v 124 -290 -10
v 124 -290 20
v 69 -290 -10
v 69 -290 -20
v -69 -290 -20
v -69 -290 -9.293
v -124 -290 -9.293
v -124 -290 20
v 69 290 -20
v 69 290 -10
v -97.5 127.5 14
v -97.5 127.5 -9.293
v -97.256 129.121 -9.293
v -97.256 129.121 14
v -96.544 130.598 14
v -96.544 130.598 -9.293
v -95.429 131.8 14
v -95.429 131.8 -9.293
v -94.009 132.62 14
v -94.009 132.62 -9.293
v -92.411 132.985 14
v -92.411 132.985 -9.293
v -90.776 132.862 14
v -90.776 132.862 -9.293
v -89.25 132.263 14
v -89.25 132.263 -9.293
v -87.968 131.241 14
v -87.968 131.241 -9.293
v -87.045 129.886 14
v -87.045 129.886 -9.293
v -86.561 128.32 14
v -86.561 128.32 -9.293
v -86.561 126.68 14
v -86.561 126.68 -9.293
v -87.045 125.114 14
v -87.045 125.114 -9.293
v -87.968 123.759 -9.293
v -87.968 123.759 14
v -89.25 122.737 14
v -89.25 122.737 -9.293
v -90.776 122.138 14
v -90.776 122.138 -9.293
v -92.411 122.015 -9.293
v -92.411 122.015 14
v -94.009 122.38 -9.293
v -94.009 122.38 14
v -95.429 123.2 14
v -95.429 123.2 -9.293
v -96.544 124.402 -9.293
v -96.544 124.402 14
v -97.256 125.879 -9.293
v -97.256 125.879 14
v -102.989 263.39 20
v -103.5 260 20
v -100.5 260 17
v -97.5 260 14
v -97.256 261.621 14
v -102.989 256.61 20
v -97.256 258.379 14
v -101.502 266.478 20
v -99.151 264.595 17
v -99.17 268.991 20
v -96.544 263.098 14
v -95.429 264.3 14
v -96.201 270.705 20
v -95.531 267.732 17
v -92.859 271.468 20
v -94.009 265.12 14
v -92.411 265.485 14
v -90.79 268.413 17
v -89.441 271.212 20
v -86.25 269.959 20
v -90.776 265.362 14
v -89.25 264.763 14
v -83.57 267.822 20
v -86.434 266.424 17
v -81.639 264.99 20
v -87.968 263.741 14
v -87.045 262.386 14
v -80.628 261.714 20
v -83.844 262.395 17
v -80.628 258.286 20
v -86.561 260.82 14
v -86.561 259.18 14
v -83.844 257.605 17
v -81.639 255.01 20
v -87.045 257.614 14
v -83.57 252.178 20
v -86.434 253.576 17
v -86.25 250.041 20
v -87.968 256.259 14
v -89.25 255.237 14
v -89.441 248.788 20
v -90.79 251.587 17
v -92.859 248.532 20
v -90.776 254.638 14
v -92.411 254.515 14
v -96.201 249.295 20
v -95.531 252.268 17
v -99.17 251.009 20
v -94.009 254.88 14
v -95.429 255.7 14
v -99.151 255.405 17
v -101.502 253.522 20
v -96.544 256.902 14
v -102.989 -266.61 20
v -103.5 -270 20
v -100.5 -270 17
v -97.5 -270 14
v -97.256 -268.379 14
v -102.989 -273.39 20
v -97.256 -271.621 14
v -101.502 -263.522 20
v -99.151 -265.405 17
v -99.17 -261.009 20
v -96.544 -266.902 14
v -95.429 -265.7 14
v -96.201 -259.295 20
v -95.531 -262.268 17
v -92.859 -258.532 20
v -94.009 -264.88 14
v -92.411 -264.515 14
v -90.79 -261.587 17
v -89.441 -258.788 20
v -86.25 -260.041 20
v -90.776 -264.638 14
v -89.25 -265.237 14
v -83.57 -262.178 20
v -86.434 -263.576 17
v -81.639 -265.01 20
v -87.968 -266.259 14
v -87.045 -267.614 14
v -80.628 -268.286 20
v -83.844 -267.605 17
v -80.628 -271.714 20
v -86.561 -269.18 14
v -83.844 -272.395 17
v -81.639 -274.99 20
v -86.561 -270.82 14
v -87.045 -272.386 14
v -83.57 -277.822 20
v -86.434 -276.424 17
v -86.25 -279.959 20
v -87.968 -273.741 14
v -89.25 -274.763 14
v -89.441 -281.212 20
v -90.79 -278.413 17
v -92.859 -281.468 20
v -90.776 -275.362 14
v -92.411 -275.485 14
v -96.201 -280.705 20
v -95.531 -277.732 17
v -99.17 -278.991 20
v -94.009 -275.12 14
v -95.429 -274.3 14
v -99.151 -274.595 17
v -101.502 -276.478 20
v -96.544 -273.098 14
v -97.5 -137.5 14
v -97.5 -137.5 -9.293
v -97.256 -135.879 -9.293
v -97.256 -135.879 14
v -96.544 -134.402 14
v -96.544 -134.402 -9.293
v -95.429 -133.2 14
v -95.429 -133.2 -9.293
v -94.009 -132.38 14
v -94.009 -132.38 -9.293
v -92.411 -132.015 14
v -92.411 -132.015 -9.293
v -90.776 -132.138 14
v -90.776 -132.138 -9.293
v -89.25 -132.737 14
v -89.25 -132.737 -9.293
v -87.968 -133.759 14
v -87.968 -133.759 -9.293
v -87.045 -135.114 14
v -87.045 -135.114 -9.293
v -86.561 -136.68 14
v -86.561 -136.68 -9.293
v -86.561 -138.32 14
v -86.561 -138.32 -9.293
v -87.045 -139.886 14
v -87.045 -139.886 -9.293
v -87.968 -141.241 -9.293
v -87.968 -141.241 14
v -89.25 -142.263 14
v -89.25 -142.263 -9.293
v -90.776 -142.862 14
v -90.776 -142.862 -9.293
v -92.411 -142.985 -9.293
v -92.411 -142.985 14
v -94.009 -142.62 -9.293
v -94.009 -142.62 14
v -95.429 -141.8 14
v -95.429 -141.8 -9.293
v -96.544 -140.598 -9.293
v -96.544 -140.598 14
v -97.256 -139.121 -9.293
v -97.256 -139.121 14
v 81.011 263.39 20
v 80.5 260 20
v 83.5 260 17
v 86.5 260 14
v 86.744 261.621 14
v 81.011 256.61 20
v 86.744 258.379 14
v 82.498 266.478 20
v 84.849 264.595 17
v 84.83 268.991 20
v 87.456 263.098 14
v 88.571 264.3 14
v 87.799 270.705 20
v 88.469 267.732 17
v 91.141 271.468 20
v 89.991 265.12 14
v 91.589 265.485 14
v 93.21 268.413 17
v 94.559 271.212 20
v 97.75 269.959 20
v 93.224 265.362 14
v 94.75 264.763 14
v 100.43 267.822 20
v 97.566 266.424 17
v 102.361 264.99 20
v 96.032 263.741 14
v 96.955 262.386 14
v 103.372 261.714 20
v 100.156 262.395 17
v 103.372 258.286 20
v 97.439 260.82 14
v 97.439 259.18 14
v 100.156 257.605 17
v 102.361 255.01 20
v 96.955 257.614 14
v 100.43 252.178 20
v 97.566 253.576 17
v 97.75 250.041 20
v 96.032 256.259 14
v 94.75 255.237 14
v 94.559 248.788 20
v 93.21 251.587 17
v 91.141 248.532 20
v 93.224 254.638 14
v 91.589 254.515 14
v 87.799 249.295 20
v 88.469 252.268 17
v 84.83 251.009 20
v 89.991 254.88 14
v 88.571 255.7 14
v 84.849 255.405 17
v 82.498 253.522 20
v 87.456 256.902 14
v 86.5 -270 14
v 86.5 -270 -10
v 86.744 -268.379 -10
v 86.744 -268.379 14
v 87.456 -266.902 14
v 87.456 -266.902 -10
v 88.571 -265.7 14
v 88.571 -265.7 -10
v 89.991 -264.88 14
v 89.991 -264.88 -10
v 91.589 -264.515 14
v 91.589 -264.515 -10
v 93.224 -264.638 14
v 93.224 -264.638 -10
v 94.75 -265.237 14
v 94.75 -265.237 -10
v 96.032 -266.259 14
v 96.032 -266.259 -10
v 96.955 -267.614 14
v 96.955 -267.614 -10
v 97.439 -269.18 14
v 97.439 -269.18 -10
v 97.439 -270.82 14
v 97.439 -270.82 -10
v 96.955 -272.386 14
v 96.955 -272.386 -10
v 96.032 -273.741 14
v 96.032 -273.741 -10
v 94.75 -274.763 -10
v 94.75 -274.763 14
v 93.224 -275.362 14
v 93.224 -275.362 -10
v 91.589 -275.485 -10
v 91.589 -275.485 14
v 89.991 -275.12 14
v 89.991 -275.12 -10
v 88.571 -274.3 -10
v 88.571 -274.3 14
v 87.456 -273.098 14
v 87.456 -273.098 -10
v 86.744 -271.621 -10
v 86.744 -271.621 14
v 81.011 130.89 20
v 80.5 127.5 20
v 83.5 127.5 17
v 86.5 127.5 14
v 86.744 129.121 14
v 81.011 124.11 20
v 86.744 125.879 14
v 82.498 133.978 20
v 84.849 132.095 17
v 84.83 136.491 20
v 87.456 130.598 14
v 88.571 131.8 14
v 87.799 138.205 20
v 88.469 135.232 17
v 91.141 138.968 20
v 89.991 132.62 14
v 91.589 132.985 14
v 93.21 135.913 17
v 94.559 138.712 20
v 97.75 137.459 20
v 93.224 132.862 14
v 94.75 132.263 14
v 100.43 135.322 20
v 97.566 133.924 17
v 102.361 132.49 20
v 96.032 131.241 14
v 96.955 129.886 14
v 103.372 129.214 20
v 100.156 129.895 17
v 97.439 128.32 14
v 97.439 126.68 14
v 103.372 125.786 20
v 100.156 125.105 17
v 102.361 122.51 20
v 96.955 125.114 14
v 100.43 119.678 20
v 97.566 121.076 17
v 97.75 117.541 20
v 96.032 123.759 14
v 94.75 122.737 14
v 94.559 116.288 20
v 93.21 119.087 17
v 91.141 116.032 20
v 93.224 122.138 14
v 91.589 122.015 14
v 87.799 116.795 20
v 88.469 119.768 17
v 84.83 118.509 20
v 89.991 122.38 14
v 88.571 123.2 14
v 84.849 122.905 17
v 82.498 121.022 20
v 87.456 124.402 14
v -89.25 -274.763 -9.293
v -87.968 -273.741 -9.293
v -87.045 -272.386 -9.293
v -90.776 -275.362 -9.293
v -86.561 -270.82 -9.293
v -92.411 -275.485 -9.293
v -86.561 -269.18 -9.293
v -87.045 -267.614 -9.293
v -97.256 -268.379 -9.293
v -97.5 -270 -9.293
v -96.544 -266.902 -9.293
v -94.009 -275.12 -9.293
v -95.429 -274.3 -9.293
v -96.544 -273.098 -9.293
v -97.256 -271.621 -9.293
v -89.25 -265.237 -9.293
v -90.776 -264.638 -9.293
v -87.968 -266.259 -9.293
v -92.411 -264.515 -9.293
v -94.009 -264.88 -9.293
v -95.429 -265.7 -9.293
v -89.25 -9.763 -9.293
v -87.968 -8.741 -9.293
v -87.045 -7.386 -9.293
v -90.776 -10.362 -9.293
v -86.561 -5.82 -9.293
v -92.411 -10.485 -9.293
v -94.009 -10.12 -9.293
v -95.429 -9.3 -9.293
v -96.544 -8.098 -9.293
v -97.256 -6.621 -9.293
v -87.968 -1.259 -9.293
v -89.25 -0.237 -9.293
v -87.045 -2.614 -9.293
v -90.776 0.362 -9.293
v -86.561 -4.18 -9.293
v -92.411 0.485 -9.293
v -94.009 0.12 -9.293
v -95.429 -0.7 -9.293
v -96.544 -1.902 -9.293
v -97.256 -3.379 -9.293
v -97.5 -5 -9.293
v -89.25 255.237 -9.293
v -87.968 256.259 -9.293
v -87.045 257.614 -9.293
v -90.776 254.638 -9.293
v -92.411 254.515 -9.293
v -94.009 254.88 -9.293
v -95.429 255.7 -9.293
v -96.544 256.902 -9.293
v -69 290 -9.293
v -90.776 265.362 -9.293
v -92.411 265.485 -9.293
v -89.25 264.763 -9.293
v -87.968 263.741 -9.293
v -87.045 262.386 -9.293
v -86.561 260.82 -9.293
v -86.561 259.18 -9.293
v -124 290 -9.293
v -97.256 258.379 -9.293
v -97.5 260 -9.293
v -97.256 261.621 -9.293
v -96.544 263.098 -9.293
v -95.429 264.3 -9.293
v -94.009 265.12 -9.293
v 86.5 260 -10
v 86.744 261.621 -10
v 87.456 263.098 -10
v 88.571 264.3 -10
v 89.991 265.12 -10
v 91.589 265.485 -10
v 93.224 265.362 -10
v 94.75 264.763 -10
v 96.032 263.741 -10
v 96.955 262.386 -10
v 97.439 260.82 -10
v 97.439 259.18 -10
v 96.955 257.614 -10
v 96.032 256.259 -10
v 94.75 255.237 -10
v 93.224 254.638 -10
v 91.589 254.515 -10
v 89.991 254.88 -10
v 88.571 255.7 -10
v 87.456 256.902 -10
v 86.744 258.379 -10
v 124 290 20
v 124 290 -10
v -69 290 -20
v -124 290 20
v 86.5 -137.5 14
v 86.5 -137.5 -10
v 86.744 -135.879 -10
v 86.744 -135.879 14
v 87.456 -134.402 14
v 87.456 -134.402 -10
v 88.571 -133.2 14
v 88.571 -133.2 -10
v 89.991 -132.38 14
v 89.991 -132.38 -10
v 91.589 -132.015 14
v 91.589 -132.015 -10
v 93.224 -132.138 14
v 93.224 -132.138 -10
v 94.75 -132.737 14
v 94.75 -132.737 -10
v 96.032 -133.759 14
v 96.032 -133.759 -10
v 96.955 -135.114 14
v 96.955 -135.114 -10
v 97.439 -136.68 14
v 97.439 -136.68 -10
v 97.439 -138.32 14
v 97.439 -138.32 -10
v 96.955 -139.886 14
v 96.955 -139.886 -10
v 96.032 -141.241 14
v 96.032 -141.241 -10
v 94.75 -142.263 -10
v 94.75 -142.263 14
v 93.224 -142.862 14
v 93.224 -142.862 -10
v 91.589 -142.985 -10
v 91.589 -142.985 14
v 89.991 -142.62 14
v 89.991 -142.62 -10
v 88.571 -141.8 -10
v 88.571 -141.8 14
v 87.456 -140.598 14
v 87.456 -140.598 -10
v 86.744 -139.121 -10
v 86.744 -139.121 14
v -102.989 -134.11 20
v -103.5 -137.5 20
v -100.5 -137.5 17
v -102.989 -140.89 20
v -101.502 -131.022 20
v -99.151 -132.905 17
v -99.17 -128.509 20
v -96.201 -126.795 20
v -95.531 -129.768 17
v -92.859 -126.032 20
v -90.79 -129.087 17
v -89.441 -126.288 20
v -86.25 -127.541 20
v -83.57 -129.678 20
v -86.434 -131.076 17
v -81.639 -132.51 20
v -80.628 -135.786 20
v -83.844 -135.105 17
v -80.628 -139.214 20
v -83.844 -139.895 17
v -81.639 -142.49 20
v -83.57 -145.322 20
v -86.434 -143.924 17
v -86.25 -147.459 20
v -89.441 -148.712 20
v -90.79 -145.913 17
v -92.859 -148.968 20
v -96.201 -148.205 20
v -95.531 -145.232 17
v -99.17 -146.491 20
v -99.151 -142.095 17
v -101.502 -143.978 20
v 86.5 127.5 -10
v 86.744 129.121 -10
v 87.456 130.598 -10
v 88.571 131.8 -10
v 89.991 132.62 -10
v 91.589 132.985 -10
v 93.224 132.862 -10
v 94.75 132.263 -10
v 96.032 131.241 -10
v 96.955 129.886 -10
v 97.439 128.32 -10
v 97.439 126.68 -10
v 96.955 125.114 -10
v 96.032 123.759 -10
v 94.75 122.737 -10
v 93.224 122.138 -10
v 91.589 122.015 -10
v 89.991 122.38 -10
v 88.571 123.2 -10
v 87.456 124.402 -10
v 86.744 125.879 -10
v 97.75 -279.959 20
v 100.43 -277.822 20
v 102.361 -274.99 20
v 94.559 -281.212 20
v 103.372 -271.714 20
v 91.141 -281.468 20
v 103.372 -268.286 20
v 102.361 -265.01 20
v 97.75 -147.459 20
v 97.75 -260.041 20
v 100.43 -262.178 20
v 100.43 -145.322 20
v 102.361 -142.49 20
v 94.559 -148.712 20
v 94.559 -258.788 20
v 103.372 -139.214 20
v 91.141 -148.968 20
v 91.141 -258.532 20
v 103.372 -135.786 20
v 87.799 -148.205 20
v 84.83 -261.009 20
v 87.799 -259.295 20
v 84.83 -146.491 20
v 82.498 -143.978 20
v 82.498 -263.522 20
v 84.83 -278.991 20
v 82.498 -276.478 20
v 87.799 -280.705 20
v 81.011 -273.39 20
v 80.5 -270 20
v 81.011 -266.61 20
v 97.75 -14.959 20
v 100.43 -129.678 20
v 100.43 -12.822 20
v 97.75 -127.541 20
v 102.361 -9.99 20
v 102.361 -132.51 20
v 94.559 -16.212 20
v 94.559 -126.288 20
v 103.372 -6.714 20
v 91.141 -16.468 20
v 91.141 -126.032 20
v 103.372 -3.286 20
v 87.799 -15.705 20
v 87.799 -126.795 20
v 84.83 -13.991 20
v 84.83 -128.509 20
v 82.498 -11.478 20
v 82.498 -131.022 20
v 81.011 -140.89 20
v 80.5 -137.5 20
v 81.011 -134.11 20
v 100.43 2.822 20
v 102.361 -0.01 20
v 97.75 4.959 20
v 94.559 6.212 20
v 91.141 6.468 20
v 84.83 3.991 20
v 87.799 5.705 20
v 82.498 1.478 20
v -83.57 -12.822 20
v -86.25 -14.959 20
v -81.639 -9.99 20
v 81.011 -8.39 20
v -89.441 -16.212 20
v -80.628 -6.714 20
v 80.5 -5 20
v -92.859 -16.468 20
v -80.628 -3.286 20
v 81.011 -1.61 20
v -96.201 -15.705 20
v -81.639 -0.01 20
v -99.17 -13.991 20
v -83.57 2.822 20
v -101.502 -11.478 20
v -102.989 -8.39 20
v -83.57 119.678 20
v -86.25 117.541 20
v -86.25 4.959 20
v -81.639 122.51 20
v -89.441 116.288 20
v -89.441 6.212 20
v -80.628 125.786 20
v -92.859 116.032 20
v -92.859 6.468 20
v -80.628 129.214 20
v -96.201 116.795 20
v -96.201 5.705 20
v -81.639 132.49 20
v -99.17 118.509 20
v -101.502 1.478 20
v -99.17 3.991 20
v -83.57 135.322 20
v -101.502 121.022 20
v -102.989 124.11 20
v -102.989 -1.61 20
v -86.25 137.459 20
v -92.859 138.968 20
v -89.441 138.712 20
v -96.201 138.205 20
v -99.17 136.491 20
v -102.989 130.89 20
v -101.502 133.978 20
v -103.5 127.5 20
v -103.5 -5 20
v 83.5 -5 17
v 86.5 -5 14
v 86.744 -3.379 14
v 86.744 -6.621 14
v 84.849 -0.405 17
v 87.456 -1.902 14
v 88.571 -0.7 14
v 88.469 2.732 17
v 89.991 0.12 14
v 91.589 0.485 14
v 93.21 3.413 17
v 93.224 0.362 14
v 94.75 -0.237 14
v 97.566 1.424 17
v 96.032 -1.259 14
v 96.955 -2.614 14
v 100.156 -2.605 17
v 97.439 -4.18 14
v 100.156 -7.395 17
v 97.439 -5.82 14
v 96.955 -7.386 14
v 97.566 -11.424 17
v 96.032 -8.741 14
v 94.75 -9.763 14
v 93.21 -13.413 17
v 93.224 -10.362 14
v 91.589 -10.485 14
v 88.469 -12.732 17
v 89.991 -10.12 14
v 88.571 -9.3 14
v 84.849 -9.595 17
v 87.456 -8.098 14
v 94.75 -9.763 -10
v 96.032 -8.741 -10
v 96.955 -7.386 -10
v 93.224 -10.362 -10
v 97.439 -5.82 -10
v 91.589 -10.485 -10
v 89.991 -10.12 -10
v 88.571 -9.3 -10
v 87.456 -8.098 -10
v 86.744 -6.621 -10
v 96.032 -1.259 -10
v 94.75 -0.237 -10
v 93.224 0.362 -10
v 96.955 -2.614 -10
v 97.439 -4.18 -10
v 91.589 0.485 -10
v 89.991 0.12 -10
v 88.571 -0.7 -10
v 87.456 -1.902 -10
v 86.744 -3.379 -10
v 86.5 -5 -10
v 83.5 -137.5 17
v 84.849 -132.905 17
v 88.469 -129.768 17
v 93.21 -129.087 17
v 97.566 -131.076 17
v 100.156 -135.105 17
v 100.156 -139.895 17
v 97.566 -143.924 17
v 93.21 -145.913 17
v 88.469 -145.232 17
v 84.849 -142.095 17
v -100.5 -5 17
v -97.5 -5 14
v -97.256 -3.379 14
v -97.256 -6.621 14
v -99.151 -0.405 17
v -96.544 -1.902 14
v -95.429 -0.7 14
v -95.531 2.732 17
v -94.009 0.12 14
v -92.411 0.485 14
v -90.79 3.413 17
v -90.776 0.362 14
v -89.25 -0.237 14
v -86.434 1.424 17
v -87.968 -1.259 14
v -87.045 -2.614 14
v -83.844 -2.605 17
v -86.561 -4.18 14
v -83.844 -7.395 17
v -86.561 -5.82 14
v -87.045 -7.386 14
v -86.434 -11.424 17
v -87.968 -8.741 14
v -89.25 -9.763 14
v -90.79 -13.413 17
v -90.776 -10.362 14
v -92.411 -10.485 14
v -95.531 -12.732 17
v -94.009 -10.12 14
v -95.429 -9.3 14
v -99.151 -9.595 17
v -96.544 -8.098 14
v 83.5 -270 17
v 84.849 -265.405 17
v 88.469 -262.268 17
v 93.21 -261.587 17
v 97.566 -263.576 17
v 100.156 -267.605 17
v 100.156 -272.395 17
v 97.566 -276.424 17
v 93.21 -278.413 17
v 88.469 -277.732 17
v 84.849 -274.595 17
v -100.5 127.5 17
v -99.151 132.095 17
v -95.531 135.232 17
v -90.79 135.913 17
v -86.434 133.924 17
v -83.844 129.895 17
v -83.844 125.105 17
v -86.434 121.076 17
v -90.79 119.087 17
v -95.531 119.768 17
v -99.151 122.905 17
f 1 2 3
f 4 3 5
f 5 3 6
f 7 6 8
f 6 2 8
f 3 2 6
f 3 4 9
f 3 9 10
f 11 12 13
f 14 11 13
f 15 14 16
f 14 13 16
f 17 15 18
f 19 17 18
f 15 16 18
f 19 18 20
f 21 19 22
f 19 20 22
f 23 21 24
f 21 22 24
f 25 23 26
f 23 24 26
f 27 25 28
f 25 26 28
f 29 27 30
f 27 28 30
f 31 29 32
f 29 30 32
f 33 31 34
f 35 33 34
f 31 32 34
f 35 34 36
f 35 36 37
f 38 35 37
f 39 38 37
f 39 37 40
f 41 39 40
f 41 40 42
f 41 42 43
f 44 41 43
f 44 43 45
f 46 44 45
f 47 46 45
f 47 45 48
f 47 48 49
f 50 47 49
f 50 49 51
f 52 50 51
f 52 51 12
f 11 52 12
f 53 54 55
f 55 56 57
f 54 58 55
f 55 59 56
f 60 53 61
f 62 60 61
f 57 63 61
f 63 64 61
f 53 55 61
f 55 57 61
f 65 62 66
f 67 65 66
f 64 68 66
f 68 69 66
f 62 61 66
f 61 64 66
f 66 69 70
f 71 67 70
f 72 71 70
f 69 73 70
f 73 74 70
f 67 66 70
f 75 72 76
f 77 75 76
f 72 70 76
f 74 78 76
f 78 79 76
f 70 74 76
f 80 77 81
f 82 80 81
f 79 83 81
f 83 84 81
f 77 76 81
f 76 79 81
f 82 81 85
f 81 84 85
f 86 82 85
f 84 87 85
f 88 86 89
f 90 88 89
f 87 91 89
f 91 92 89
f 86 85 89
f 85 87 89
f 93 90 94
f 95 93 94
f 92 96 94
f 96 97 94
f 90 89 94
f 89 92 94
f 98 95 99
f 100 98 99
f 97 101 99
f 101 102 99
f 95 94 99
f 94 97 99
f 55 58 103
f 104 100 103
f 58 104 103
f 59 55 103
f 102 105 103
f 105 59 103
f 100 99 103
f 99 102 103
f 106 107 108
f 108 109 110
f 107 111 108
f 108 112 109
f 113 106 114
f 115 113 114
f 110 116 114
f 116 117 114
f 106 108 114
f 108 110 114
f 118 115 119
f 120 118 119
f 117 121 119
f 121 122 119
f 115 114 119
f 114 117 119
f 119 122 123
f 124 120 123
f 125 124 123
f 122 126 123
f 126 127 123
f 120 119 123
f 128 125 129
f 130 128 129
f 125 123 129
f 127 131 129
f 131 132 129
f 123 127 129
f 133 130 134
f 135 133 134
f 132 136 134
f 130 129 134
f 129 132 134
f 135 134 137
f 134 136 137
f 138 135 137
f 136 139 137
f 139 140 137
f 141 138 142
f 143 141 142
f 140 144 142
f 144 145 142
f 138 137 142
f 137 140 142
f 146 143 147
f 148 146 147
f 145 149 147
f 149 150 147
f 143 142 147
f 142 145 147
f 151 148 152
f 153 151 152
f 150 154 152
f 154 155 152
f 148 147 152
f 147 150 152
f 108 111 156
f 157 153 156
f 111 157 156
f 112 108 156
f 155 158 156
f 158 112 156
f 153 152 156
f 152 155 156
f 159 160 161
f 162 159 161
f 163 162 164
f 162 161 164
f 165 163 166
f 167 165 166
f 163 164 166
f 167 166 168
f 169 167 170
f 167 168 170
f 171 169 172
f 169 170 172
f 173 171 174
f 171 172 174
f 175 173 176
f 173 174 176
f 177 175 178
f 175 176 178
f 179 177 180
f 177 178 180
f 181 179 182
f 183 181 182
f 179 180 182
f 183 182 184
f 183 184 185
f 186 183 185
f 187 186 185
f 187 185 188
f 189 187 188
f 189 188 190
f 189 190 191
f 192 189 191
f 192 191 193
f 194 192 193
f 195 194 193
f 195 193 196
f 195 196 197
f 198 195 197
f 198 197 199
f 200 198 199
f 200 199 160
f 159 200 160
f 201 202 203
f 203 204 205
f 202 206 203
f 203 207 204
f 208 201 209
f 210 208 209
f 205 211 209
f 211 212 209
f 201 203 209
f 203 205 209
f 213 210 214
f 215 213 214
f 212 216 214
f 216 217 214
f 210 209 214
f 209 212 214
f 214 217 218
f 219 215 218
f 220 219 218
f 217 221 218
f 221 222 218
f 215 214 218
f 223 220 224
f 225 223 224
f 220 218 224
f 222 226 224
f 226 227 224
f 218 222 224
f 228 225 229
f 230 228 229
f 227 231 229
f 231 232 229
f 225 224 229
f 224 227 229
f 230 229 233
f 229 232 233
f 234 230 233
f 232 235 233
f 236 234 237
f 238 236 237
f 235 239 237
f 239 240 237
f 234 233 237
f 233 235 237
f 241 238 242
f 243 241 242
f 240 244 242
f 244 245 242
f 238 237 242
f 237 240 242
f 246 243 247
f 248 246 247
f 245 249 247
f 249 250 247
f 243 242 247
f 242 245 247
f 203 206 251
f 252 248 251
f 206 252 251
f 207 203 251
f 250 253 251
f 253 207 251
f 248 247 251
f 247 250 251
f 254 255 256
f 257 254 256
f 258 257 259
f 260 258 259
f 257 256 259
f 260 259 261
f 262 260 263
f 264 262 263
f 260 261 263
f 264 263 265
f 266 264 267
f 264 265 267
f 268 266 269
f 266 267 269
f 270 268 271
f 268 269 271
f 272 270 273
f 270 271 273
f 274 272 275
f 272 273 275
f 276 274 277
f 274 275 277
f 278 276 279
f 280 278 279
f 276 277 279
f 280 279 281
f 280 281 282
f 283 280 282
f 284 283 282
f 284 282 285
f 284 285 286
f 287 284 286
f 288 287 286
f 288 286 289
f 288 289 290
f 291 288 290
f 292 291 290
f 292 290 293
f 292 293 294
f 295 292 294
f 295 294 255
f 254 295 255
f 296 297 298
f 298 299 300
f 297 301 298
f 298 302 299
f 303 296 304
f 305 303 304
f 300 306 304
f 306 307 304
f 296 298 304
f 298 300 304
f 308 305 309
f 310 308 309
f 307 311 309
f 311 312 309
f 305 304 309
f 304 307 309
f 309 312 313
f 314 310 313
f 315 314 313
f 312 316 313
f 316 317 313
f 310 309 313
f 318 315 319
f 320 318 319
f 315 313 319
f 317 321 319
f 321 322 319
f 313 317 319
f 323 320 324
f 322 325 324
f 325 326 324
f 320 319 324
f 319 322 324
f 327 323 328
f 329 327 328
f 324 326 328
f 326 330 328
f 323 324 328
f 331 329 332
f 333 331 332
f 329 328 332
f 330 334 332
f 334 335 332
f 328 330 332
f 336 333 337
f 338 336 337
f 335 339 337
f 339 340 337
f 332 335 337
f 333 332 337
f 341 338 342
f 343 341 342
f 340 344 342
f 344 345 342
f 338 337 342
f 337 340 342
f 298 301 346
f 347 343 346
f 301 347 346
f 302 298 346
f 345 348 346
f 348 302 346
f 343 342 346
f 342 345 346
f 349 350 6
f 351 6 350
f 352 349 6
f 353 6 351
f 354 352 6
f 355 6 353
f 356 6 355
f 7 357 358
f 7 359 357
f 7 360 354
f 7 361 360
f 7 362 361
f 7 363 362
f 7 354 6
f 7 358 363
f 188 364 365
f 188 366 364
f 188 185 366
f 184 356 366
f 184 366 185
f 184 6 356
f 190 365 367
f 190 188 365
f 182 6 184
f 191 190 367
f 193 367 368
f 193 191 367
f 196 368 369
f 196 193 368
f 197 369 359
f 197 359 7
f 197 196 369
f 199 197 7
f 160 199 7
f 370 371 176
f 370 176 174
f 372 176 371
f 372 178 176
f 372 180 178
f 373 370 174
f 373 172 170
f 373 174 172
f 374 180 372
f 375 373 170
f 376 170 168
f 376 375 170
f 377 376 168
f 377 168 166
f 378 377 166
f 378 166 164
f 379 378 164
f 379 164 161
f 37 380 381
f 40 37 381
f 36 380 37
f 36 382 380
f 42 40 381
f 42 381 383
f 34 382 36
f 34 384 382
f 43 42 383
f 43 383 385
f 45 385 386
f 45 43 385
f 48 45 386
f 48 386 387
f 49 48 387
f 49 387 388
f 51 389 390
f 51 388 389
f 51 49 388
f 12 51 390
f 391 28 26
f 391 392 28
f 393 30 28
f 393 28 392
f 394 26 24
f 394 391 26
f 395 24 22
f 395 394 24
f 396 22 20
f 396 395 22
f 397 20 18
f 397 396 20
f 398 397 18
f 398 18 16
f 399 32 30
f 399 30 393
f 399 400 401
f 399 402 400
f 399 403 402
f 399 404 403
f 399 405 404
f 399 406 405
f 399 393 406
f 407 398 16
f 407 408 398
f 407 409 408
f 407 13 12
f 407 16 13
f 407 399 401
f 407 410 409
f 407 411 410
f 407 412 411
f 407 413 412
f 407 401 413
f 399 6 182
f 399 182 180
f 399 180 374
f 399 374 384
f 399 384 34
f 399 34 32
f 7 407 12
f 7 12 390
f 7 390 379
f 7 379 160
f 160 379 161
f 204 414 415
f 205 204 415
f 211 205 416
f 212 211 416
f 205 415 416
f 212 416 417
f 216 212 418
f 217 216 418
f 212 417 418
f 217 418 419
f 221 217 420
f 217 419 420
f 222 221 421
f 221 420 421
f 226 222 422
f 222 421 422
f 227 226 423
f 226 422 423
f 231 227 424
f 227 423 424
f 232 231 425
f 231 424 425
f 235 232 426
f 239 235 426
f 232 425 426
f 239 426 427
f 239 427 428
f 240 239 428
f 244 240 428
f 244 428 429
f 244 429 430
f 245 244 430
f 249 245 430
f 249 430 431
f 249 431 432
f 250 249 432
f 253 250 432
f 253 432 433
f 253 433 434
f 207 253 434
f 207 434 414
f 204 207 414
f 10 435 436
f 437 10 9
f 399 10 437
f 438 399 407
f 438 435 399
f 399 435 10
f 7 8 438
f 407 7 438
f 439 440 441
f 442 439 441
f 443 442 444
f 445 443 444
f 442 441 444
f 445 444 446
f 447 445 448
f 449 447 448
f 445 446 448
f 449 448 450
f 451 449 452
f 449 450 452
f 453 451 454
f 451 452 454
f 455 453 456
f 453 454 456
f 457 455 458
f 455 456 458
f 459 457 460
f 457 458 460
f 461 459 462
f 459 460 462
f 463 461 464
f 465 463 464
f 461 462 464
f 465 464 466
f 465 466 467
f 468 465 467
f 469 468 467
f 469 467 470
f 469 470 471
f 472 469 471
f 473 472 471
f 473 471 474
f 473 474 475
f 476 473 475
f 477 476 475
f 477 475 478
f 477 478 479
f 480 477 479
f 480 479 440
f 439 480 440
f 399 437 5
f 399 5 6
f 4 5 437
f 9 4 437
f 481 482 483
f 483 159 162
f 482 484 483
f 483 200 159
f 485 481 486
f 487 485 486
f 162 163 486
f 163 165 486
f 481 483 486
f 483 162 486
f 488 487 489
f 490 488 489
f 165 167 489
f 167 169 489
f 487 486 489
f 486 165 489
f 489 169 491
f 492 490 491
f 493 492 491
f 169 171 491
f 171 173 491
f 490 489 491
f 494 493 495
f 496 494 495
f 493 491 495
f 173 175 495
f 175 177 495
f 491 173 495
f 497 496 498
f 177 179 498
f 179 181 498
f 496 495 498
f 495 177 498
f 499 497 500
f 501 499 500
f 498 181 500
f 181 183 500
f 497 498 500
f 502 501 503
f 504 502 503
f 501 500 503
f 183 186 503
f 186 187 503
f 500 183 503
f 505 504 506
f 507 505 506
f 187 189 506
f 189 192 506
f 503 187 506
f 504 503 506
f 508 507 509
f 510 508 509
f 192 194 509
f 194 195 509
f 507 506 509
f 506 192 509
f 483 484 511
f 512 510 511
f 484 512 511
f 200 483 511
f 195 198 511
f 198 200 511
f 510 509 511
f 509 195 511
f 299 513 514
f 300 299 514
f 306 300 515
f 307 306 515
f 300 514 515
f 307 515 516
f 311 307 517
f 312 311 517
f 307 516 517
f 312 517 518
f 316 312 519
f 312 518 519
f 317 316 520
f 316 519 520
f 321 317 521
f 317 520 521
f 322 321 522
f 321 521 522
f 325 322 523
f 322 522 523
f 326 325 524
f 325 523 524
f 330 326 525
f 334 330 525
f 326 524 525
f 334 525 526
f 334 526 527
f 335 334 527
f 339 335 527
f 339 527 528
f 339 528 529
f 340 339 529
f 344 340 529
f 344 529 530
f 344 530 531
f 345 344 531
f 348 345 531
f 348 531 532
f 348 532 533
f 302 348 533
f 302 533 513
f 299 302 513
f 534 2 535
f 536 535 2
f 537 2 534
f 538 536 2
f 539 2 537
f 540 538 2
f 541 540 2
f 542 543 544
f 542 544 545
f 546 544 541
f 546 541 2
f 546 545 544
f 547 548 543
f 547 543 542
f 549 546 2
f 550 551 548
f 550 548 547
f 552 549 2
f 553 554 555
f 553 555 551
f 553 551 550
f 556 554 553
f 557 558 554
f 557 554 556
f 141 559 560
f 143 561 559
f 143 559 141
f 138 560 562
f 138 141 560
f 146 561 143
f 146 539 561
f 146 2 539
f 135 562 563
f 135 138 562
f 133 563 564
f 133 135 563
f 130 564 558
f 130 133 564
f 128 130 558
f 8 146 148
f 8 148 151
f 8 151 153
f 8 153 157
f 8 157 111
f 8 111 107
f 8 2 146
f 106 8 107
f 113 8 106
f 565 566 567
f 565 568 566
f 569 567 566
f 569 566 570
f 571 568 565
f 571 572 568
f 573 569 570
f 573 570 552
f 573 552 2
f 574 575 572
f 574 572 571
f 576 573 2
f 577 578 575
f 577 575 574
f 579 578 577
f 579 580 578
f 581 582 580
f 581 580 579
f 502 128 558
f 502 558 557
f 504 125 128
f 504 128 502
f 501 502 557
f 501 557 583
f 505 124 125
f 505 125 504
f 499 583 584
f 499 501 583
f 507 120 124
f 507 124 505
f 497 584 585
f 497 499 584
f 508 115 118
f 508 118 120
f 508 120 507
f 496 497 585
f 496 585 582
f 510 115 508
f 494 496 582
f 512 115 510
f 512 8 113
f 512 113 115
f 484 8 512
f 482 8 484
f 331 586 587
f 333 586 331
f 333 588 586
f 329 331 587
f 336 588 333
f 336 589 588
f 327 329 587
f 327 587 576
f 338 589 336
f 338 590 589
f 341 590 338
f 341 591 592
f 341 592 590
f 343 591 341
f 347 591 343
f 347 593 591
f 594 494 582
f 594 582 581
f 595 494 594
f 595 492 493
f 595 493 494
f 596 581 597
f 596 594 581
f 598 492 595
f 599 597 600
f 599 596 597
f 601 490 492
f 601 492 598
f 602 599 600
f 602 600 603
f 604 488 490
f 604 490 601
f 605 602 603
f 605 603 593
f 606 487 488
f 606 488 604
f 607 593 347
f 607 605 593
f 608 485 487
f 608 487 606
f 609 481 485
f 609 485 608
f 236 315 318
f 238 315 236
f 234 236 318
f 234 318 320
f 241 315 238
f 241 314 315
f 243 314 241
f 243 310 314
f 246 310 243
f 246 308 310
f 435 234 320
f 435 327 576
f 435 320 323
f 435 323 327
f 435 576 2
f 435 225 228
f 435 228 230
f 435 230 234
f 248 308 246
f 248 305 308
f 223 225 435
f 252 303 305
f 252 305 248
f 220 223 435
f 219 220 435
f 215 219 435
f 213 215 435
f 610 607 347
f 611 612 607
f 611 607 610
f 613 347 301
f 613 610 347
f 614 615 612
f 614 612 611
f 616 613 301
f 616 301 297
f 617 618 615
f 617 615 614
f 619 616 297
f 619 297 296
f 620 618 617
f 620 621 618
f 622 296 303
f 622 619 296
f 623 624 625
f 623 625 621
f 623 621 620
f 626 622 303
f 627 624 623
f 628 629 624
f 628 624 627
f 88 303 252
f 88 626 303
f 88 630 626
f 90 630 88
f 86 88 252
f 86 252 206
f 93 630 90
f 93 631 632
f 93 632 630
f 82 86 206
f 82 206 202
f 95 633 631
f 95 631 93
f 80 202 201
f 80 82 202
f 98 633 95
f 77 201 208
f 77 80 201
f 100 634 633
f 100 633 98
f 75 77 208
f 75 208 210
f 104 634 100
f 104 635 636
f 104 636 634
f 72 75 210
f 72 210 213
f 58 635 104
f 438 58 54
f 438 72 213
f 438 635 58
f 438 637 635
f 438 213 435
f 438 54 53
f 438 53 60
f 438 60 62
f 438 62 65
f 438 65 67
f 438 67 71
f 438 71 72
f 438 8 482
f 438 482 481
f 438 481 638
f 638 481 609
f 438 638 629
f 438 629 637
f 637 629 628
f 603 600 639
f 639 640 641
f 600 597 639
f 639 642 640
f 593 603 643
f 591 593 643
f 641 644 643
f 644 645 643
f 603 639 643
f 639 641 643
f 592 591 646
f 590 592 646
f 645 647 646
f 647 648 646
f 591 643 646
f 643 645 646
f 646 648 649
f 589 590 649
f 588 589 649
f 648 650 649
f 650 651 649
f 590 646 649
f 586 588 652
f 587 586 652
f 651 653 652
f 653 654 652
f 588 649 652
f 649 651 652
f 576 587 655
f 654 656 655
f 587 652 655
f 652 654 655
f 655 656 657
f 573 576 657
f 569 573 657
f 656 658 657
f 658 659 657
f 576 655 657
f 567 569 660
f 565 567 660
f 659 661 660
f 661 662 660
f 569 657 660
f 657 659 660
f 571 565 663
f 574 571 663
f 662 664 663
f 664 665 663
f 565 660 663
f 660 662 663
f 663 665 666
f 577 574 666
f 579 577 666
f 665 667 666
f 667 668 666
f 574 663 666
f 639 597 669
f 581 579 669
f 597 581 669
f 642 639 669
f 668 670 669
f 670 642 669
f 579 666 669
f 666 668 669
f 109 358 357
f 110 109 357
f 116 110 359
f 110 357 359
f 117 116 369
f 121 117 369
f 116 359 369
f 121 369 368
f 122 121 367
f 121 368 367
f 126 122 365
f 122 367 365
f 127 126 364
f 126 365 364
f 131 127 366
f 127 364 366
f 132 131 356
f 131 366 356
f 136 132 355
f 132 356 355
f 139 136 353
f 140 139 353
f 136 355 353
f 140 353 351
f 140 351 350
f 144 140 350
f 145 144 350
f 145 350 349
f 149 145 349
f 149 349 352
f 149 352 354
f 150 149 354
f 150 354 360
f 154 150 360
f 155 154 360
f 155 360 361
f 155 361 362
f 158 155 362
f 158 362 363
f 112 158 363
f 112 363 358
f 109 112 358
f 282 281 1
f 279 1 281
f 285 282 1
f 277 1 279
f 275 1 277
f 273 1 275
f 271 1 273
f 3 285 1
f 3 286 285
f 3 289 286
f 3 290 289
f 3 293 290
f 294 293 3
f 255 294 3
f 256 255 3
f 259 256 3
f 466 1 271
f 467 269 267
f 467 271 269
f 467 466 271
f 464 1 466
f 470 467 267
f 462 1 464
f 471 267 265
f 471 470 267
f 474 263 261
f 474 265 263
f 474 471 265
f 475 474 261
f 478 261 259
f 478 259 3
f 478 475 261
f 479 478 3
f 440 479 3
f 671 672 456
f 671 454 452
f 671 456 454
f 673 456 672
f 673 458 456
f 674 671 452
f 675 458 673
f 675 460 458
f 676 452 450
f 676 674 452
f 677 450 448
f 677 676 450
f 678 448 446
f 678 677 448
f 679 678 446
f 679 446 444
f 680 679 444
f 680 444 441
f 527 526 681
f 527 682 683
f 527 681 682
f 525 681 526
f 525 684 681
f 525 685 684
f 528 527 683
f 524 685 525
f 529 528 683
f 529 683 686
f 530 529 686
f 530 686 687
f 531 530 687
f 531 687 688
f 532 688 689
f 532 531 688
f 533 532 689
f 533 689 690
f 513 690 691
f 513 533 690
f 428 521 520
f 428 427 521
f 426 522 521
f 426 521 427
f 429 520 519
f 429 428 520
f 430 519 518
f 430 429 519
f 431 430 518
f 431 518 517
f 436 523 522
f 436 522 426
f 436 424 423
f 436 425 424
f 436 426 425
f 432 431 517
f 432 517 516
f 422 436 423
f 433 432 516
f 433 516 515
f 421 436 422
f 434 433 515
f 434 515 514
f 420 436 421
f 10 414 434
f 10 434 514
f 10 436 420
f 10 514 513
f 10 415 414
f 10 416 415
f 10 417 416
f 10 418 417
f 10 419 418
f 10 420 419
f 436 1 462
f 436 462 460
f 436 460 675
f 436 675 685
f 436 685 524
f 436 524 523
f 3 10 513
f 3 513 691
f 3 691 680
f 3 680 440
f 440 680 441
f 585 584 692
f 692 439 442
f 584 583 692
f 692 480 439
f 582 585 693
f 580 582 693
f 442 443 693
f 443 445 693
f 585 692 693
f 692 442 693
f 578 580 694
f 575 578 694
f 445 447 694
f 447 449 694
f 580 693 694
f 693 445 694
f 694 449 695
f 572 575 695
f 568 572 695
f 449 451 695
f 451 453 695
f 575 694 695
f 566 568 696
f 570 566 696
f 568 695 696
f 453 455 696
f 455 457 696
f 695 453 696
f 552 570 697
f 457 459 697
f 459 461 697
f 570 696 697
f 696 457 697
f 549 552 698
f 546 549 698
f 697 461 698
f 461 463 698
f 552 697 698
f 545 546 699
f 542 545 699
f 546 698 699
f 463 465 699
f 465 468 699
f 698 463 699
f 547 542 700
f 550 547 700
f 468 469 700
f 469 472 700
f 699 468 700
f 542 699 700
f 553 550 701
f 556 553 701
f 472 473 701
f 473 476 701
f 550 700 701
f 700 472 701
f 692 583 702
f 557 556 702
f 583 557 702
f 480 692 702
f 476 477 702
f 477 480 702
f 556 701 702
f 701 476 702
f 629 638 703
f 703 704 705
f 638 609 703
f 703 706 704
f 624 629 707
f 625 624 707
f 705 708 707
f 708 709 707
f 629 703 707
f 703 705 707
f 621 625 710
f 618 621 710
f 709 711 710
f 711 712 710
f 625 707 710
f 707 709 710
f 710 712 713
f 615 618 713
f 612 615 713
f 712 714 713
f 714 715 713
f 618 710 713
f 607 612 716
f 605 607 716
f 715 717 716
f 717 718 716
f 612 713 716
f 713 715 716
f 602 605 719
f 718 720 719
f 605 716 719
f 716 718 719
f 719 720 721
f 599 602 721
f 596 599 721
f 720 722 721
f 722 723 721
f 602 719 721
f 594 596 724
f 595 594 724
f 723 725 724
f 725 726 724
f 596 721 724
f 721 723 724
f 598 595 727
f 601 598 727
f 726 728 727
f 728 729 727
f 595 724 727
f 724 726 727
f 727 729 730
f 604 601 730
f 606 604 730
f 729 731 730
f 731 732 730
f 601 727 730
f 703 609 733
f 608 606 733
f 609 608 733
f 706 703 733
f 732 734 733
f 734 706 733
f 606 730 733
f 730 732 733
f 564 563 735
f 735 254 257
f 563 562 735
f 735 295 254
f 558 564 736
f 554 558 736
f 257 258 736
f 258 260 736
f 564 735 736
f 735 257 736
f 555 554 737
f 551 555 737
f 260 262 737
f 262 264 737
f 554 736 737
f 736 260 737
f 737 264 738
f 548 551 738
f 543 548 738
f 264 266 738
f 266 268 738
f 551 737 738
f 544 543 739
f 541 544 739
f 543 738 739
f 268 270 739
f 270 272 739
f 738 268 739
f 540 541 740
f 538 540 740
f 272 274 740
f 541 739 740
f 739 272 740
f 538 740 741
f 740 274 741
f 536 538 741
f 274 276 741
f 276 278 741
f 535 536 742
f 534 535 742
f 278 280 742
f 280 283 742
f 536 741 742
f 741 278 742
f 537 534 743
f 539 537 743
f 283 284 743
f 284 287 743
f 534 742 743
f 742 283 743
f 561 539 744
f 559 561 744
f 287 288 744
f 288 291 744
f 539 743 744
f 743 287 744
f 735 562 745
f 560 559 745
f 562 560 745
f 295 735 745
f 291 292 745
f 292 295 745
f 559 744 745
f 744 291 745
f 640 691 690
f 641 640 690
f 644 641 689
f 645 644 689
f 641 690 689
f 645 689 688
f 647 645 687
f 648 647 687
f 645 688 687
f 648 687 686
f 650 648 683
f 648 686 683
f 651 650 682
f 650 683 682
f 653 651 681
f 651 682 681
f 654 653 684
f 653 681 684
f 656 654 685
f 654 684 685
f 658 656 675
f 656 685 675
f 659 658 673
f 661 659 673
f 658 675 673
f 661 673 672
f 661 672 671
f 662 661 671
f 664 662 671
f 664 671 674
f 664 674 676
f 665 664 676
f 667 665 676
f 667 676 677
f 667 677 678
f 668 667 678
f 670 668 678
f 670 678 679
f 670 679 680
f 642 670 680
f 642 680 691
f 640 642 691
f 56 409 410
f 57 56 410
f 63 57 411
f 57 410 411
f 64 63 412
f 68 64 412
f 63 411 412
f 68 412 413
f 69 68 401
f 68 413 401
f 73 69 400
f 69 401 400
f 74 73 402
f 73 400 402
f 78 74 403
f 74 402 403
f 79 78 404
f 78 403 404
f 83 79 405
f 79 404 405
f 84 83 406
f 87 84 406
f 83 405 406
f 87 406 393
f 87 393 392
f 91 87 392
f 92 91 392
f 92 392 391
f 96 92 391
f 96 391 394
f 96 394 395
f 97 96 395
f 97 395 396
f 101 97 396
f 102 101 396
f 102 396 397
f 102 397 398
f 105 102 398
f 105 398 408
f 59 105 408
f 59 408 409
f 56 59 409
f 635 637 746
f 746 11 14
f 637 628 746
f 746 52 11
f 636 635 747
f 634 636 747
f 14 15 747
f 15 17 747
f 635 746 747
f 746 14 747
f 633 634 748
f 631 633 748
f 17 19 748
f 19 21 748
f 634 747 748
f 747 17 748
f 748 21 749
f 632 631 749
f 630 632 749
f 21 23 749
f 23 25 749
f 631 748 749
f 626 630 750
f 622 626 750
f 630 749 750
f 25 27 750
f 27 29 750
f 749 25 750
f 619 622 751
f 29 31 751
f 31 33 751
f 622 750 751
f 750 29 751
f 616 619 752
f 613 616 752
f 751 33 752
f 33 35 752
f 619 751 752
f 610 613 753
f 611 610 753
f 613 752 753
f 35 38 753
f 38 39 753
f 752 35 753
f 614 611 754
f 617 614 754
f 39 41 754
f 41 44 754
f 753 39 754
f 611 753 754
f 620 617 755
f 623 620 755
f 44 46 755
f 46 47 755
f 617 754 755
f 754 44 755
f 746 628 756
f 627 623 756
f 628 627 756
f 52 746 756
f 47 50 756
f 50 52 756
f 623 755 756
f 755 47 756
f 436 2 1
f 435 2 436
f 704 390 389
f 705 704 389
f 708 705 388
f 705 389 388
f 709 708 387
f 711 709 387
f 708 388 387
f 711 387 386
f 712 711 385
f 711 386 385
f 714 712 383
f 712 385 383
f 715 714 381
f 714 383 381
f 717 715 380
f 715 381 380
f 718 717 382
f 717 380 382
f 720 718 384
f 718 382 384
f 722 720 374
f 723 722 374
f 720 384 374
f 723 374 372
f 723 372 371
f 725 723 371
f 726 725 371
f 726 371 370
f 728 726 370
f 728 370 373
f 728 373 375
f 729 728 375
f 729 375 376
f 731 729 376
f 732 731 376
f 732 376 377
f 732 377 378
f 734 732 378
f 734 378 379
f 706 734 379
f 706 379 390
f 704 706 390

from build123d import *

# Parameters (mm, degrees)
SKETCH2_W                  = 580
SKETCH2_H                  = 248
BOSS_EXTRUDE1_DEPTH        = 20
SKETCH3_W                  = 55
SKETCH3_H                  = 10.706810323
SKETCH3_H_2                = 10
CUT_EXTRUDE1_DEPTH         = 594.444184402
F_11_0_11_DIAMETER_HOLE1_D = 11
LPATTERN1_COUNT            = 5
LPATTERN1_PITCH            = 132.5
CHAMFER1_SIZE              = 6


with BuildPart() as part:
    # Sketch2 → Boss-Extrude1 (new, symmetric)
    with BuildSketch(Plane(origin=(0, 0, 0), x_dir=(0, 1, 0), z_dir=(0, 0, 1))):
        Rectangle(SKETCH2_W, SKETCH2_H)
    extrude(amount=BOSS_EXTRUDE1_DEPTH, both=True)

    # Sketch3 → Cut-Extrude1 (cut, through all)
    with BuildSketch(Plane(origin=(0, 290, 0), x_dir=(-1, 0, 0), z_dir=(0, 1, 0))):
        with Locations((96.5, -14.646594839)):
            Rectangle(SKETCH3_W, SKETCH3_H)
        with Locations((-96.5, -15)):
            Rectangle(SKETCH3_W, SKETCH3_H_2)
    extrude(amount=-CUT_EXTRUDE1_DEPTH, mode=Mode.SUBTRACT)

    # Ø11.0 (11) Diameter Hole1 (through all)
    with Locations(Plane(origin=(-92, -270, 20), x_dir=(1, 0, 0), z_dir=(0, 0, 1))):
        with Locations((0, 0), (184, 0)):
            f_11_0_11_diameter_hole1 = Hole(F_11_0_11_DIAMETER_HOLE1_D / 2)

    # LPattern1: Ø11.0 (11) Diameter Hole1 ×5
    with Locations(*[(0, i * LPATTERN1_PITCH, 0) for i in range(1, LPATTERN1_COUNT)]):
        add(f_11_0_11_diameter_hole1, mode=Mode.SUBTRACT)

    # Chamfer1
    chamfer1_edges = [part.edges().sort_by_distance(p)[0] for p in [
        (97.5, -270, 20),
        (-86.5, -270, 20),
        (97.5, -137.5, 20),
        (-86.5, -137.5, 20),
        (97.5, -5, 20),
        (-86.5, -5, 20),
        (97.5, 127.5, 20),
        (-86.5, 127.5, 20),
        (97.5, 260, 20),
        (-86.5, 260, 20),
    ]]
    chamfer(chamfer1_edges, length=CHAMFER1_SIZE)


solid = part.part
